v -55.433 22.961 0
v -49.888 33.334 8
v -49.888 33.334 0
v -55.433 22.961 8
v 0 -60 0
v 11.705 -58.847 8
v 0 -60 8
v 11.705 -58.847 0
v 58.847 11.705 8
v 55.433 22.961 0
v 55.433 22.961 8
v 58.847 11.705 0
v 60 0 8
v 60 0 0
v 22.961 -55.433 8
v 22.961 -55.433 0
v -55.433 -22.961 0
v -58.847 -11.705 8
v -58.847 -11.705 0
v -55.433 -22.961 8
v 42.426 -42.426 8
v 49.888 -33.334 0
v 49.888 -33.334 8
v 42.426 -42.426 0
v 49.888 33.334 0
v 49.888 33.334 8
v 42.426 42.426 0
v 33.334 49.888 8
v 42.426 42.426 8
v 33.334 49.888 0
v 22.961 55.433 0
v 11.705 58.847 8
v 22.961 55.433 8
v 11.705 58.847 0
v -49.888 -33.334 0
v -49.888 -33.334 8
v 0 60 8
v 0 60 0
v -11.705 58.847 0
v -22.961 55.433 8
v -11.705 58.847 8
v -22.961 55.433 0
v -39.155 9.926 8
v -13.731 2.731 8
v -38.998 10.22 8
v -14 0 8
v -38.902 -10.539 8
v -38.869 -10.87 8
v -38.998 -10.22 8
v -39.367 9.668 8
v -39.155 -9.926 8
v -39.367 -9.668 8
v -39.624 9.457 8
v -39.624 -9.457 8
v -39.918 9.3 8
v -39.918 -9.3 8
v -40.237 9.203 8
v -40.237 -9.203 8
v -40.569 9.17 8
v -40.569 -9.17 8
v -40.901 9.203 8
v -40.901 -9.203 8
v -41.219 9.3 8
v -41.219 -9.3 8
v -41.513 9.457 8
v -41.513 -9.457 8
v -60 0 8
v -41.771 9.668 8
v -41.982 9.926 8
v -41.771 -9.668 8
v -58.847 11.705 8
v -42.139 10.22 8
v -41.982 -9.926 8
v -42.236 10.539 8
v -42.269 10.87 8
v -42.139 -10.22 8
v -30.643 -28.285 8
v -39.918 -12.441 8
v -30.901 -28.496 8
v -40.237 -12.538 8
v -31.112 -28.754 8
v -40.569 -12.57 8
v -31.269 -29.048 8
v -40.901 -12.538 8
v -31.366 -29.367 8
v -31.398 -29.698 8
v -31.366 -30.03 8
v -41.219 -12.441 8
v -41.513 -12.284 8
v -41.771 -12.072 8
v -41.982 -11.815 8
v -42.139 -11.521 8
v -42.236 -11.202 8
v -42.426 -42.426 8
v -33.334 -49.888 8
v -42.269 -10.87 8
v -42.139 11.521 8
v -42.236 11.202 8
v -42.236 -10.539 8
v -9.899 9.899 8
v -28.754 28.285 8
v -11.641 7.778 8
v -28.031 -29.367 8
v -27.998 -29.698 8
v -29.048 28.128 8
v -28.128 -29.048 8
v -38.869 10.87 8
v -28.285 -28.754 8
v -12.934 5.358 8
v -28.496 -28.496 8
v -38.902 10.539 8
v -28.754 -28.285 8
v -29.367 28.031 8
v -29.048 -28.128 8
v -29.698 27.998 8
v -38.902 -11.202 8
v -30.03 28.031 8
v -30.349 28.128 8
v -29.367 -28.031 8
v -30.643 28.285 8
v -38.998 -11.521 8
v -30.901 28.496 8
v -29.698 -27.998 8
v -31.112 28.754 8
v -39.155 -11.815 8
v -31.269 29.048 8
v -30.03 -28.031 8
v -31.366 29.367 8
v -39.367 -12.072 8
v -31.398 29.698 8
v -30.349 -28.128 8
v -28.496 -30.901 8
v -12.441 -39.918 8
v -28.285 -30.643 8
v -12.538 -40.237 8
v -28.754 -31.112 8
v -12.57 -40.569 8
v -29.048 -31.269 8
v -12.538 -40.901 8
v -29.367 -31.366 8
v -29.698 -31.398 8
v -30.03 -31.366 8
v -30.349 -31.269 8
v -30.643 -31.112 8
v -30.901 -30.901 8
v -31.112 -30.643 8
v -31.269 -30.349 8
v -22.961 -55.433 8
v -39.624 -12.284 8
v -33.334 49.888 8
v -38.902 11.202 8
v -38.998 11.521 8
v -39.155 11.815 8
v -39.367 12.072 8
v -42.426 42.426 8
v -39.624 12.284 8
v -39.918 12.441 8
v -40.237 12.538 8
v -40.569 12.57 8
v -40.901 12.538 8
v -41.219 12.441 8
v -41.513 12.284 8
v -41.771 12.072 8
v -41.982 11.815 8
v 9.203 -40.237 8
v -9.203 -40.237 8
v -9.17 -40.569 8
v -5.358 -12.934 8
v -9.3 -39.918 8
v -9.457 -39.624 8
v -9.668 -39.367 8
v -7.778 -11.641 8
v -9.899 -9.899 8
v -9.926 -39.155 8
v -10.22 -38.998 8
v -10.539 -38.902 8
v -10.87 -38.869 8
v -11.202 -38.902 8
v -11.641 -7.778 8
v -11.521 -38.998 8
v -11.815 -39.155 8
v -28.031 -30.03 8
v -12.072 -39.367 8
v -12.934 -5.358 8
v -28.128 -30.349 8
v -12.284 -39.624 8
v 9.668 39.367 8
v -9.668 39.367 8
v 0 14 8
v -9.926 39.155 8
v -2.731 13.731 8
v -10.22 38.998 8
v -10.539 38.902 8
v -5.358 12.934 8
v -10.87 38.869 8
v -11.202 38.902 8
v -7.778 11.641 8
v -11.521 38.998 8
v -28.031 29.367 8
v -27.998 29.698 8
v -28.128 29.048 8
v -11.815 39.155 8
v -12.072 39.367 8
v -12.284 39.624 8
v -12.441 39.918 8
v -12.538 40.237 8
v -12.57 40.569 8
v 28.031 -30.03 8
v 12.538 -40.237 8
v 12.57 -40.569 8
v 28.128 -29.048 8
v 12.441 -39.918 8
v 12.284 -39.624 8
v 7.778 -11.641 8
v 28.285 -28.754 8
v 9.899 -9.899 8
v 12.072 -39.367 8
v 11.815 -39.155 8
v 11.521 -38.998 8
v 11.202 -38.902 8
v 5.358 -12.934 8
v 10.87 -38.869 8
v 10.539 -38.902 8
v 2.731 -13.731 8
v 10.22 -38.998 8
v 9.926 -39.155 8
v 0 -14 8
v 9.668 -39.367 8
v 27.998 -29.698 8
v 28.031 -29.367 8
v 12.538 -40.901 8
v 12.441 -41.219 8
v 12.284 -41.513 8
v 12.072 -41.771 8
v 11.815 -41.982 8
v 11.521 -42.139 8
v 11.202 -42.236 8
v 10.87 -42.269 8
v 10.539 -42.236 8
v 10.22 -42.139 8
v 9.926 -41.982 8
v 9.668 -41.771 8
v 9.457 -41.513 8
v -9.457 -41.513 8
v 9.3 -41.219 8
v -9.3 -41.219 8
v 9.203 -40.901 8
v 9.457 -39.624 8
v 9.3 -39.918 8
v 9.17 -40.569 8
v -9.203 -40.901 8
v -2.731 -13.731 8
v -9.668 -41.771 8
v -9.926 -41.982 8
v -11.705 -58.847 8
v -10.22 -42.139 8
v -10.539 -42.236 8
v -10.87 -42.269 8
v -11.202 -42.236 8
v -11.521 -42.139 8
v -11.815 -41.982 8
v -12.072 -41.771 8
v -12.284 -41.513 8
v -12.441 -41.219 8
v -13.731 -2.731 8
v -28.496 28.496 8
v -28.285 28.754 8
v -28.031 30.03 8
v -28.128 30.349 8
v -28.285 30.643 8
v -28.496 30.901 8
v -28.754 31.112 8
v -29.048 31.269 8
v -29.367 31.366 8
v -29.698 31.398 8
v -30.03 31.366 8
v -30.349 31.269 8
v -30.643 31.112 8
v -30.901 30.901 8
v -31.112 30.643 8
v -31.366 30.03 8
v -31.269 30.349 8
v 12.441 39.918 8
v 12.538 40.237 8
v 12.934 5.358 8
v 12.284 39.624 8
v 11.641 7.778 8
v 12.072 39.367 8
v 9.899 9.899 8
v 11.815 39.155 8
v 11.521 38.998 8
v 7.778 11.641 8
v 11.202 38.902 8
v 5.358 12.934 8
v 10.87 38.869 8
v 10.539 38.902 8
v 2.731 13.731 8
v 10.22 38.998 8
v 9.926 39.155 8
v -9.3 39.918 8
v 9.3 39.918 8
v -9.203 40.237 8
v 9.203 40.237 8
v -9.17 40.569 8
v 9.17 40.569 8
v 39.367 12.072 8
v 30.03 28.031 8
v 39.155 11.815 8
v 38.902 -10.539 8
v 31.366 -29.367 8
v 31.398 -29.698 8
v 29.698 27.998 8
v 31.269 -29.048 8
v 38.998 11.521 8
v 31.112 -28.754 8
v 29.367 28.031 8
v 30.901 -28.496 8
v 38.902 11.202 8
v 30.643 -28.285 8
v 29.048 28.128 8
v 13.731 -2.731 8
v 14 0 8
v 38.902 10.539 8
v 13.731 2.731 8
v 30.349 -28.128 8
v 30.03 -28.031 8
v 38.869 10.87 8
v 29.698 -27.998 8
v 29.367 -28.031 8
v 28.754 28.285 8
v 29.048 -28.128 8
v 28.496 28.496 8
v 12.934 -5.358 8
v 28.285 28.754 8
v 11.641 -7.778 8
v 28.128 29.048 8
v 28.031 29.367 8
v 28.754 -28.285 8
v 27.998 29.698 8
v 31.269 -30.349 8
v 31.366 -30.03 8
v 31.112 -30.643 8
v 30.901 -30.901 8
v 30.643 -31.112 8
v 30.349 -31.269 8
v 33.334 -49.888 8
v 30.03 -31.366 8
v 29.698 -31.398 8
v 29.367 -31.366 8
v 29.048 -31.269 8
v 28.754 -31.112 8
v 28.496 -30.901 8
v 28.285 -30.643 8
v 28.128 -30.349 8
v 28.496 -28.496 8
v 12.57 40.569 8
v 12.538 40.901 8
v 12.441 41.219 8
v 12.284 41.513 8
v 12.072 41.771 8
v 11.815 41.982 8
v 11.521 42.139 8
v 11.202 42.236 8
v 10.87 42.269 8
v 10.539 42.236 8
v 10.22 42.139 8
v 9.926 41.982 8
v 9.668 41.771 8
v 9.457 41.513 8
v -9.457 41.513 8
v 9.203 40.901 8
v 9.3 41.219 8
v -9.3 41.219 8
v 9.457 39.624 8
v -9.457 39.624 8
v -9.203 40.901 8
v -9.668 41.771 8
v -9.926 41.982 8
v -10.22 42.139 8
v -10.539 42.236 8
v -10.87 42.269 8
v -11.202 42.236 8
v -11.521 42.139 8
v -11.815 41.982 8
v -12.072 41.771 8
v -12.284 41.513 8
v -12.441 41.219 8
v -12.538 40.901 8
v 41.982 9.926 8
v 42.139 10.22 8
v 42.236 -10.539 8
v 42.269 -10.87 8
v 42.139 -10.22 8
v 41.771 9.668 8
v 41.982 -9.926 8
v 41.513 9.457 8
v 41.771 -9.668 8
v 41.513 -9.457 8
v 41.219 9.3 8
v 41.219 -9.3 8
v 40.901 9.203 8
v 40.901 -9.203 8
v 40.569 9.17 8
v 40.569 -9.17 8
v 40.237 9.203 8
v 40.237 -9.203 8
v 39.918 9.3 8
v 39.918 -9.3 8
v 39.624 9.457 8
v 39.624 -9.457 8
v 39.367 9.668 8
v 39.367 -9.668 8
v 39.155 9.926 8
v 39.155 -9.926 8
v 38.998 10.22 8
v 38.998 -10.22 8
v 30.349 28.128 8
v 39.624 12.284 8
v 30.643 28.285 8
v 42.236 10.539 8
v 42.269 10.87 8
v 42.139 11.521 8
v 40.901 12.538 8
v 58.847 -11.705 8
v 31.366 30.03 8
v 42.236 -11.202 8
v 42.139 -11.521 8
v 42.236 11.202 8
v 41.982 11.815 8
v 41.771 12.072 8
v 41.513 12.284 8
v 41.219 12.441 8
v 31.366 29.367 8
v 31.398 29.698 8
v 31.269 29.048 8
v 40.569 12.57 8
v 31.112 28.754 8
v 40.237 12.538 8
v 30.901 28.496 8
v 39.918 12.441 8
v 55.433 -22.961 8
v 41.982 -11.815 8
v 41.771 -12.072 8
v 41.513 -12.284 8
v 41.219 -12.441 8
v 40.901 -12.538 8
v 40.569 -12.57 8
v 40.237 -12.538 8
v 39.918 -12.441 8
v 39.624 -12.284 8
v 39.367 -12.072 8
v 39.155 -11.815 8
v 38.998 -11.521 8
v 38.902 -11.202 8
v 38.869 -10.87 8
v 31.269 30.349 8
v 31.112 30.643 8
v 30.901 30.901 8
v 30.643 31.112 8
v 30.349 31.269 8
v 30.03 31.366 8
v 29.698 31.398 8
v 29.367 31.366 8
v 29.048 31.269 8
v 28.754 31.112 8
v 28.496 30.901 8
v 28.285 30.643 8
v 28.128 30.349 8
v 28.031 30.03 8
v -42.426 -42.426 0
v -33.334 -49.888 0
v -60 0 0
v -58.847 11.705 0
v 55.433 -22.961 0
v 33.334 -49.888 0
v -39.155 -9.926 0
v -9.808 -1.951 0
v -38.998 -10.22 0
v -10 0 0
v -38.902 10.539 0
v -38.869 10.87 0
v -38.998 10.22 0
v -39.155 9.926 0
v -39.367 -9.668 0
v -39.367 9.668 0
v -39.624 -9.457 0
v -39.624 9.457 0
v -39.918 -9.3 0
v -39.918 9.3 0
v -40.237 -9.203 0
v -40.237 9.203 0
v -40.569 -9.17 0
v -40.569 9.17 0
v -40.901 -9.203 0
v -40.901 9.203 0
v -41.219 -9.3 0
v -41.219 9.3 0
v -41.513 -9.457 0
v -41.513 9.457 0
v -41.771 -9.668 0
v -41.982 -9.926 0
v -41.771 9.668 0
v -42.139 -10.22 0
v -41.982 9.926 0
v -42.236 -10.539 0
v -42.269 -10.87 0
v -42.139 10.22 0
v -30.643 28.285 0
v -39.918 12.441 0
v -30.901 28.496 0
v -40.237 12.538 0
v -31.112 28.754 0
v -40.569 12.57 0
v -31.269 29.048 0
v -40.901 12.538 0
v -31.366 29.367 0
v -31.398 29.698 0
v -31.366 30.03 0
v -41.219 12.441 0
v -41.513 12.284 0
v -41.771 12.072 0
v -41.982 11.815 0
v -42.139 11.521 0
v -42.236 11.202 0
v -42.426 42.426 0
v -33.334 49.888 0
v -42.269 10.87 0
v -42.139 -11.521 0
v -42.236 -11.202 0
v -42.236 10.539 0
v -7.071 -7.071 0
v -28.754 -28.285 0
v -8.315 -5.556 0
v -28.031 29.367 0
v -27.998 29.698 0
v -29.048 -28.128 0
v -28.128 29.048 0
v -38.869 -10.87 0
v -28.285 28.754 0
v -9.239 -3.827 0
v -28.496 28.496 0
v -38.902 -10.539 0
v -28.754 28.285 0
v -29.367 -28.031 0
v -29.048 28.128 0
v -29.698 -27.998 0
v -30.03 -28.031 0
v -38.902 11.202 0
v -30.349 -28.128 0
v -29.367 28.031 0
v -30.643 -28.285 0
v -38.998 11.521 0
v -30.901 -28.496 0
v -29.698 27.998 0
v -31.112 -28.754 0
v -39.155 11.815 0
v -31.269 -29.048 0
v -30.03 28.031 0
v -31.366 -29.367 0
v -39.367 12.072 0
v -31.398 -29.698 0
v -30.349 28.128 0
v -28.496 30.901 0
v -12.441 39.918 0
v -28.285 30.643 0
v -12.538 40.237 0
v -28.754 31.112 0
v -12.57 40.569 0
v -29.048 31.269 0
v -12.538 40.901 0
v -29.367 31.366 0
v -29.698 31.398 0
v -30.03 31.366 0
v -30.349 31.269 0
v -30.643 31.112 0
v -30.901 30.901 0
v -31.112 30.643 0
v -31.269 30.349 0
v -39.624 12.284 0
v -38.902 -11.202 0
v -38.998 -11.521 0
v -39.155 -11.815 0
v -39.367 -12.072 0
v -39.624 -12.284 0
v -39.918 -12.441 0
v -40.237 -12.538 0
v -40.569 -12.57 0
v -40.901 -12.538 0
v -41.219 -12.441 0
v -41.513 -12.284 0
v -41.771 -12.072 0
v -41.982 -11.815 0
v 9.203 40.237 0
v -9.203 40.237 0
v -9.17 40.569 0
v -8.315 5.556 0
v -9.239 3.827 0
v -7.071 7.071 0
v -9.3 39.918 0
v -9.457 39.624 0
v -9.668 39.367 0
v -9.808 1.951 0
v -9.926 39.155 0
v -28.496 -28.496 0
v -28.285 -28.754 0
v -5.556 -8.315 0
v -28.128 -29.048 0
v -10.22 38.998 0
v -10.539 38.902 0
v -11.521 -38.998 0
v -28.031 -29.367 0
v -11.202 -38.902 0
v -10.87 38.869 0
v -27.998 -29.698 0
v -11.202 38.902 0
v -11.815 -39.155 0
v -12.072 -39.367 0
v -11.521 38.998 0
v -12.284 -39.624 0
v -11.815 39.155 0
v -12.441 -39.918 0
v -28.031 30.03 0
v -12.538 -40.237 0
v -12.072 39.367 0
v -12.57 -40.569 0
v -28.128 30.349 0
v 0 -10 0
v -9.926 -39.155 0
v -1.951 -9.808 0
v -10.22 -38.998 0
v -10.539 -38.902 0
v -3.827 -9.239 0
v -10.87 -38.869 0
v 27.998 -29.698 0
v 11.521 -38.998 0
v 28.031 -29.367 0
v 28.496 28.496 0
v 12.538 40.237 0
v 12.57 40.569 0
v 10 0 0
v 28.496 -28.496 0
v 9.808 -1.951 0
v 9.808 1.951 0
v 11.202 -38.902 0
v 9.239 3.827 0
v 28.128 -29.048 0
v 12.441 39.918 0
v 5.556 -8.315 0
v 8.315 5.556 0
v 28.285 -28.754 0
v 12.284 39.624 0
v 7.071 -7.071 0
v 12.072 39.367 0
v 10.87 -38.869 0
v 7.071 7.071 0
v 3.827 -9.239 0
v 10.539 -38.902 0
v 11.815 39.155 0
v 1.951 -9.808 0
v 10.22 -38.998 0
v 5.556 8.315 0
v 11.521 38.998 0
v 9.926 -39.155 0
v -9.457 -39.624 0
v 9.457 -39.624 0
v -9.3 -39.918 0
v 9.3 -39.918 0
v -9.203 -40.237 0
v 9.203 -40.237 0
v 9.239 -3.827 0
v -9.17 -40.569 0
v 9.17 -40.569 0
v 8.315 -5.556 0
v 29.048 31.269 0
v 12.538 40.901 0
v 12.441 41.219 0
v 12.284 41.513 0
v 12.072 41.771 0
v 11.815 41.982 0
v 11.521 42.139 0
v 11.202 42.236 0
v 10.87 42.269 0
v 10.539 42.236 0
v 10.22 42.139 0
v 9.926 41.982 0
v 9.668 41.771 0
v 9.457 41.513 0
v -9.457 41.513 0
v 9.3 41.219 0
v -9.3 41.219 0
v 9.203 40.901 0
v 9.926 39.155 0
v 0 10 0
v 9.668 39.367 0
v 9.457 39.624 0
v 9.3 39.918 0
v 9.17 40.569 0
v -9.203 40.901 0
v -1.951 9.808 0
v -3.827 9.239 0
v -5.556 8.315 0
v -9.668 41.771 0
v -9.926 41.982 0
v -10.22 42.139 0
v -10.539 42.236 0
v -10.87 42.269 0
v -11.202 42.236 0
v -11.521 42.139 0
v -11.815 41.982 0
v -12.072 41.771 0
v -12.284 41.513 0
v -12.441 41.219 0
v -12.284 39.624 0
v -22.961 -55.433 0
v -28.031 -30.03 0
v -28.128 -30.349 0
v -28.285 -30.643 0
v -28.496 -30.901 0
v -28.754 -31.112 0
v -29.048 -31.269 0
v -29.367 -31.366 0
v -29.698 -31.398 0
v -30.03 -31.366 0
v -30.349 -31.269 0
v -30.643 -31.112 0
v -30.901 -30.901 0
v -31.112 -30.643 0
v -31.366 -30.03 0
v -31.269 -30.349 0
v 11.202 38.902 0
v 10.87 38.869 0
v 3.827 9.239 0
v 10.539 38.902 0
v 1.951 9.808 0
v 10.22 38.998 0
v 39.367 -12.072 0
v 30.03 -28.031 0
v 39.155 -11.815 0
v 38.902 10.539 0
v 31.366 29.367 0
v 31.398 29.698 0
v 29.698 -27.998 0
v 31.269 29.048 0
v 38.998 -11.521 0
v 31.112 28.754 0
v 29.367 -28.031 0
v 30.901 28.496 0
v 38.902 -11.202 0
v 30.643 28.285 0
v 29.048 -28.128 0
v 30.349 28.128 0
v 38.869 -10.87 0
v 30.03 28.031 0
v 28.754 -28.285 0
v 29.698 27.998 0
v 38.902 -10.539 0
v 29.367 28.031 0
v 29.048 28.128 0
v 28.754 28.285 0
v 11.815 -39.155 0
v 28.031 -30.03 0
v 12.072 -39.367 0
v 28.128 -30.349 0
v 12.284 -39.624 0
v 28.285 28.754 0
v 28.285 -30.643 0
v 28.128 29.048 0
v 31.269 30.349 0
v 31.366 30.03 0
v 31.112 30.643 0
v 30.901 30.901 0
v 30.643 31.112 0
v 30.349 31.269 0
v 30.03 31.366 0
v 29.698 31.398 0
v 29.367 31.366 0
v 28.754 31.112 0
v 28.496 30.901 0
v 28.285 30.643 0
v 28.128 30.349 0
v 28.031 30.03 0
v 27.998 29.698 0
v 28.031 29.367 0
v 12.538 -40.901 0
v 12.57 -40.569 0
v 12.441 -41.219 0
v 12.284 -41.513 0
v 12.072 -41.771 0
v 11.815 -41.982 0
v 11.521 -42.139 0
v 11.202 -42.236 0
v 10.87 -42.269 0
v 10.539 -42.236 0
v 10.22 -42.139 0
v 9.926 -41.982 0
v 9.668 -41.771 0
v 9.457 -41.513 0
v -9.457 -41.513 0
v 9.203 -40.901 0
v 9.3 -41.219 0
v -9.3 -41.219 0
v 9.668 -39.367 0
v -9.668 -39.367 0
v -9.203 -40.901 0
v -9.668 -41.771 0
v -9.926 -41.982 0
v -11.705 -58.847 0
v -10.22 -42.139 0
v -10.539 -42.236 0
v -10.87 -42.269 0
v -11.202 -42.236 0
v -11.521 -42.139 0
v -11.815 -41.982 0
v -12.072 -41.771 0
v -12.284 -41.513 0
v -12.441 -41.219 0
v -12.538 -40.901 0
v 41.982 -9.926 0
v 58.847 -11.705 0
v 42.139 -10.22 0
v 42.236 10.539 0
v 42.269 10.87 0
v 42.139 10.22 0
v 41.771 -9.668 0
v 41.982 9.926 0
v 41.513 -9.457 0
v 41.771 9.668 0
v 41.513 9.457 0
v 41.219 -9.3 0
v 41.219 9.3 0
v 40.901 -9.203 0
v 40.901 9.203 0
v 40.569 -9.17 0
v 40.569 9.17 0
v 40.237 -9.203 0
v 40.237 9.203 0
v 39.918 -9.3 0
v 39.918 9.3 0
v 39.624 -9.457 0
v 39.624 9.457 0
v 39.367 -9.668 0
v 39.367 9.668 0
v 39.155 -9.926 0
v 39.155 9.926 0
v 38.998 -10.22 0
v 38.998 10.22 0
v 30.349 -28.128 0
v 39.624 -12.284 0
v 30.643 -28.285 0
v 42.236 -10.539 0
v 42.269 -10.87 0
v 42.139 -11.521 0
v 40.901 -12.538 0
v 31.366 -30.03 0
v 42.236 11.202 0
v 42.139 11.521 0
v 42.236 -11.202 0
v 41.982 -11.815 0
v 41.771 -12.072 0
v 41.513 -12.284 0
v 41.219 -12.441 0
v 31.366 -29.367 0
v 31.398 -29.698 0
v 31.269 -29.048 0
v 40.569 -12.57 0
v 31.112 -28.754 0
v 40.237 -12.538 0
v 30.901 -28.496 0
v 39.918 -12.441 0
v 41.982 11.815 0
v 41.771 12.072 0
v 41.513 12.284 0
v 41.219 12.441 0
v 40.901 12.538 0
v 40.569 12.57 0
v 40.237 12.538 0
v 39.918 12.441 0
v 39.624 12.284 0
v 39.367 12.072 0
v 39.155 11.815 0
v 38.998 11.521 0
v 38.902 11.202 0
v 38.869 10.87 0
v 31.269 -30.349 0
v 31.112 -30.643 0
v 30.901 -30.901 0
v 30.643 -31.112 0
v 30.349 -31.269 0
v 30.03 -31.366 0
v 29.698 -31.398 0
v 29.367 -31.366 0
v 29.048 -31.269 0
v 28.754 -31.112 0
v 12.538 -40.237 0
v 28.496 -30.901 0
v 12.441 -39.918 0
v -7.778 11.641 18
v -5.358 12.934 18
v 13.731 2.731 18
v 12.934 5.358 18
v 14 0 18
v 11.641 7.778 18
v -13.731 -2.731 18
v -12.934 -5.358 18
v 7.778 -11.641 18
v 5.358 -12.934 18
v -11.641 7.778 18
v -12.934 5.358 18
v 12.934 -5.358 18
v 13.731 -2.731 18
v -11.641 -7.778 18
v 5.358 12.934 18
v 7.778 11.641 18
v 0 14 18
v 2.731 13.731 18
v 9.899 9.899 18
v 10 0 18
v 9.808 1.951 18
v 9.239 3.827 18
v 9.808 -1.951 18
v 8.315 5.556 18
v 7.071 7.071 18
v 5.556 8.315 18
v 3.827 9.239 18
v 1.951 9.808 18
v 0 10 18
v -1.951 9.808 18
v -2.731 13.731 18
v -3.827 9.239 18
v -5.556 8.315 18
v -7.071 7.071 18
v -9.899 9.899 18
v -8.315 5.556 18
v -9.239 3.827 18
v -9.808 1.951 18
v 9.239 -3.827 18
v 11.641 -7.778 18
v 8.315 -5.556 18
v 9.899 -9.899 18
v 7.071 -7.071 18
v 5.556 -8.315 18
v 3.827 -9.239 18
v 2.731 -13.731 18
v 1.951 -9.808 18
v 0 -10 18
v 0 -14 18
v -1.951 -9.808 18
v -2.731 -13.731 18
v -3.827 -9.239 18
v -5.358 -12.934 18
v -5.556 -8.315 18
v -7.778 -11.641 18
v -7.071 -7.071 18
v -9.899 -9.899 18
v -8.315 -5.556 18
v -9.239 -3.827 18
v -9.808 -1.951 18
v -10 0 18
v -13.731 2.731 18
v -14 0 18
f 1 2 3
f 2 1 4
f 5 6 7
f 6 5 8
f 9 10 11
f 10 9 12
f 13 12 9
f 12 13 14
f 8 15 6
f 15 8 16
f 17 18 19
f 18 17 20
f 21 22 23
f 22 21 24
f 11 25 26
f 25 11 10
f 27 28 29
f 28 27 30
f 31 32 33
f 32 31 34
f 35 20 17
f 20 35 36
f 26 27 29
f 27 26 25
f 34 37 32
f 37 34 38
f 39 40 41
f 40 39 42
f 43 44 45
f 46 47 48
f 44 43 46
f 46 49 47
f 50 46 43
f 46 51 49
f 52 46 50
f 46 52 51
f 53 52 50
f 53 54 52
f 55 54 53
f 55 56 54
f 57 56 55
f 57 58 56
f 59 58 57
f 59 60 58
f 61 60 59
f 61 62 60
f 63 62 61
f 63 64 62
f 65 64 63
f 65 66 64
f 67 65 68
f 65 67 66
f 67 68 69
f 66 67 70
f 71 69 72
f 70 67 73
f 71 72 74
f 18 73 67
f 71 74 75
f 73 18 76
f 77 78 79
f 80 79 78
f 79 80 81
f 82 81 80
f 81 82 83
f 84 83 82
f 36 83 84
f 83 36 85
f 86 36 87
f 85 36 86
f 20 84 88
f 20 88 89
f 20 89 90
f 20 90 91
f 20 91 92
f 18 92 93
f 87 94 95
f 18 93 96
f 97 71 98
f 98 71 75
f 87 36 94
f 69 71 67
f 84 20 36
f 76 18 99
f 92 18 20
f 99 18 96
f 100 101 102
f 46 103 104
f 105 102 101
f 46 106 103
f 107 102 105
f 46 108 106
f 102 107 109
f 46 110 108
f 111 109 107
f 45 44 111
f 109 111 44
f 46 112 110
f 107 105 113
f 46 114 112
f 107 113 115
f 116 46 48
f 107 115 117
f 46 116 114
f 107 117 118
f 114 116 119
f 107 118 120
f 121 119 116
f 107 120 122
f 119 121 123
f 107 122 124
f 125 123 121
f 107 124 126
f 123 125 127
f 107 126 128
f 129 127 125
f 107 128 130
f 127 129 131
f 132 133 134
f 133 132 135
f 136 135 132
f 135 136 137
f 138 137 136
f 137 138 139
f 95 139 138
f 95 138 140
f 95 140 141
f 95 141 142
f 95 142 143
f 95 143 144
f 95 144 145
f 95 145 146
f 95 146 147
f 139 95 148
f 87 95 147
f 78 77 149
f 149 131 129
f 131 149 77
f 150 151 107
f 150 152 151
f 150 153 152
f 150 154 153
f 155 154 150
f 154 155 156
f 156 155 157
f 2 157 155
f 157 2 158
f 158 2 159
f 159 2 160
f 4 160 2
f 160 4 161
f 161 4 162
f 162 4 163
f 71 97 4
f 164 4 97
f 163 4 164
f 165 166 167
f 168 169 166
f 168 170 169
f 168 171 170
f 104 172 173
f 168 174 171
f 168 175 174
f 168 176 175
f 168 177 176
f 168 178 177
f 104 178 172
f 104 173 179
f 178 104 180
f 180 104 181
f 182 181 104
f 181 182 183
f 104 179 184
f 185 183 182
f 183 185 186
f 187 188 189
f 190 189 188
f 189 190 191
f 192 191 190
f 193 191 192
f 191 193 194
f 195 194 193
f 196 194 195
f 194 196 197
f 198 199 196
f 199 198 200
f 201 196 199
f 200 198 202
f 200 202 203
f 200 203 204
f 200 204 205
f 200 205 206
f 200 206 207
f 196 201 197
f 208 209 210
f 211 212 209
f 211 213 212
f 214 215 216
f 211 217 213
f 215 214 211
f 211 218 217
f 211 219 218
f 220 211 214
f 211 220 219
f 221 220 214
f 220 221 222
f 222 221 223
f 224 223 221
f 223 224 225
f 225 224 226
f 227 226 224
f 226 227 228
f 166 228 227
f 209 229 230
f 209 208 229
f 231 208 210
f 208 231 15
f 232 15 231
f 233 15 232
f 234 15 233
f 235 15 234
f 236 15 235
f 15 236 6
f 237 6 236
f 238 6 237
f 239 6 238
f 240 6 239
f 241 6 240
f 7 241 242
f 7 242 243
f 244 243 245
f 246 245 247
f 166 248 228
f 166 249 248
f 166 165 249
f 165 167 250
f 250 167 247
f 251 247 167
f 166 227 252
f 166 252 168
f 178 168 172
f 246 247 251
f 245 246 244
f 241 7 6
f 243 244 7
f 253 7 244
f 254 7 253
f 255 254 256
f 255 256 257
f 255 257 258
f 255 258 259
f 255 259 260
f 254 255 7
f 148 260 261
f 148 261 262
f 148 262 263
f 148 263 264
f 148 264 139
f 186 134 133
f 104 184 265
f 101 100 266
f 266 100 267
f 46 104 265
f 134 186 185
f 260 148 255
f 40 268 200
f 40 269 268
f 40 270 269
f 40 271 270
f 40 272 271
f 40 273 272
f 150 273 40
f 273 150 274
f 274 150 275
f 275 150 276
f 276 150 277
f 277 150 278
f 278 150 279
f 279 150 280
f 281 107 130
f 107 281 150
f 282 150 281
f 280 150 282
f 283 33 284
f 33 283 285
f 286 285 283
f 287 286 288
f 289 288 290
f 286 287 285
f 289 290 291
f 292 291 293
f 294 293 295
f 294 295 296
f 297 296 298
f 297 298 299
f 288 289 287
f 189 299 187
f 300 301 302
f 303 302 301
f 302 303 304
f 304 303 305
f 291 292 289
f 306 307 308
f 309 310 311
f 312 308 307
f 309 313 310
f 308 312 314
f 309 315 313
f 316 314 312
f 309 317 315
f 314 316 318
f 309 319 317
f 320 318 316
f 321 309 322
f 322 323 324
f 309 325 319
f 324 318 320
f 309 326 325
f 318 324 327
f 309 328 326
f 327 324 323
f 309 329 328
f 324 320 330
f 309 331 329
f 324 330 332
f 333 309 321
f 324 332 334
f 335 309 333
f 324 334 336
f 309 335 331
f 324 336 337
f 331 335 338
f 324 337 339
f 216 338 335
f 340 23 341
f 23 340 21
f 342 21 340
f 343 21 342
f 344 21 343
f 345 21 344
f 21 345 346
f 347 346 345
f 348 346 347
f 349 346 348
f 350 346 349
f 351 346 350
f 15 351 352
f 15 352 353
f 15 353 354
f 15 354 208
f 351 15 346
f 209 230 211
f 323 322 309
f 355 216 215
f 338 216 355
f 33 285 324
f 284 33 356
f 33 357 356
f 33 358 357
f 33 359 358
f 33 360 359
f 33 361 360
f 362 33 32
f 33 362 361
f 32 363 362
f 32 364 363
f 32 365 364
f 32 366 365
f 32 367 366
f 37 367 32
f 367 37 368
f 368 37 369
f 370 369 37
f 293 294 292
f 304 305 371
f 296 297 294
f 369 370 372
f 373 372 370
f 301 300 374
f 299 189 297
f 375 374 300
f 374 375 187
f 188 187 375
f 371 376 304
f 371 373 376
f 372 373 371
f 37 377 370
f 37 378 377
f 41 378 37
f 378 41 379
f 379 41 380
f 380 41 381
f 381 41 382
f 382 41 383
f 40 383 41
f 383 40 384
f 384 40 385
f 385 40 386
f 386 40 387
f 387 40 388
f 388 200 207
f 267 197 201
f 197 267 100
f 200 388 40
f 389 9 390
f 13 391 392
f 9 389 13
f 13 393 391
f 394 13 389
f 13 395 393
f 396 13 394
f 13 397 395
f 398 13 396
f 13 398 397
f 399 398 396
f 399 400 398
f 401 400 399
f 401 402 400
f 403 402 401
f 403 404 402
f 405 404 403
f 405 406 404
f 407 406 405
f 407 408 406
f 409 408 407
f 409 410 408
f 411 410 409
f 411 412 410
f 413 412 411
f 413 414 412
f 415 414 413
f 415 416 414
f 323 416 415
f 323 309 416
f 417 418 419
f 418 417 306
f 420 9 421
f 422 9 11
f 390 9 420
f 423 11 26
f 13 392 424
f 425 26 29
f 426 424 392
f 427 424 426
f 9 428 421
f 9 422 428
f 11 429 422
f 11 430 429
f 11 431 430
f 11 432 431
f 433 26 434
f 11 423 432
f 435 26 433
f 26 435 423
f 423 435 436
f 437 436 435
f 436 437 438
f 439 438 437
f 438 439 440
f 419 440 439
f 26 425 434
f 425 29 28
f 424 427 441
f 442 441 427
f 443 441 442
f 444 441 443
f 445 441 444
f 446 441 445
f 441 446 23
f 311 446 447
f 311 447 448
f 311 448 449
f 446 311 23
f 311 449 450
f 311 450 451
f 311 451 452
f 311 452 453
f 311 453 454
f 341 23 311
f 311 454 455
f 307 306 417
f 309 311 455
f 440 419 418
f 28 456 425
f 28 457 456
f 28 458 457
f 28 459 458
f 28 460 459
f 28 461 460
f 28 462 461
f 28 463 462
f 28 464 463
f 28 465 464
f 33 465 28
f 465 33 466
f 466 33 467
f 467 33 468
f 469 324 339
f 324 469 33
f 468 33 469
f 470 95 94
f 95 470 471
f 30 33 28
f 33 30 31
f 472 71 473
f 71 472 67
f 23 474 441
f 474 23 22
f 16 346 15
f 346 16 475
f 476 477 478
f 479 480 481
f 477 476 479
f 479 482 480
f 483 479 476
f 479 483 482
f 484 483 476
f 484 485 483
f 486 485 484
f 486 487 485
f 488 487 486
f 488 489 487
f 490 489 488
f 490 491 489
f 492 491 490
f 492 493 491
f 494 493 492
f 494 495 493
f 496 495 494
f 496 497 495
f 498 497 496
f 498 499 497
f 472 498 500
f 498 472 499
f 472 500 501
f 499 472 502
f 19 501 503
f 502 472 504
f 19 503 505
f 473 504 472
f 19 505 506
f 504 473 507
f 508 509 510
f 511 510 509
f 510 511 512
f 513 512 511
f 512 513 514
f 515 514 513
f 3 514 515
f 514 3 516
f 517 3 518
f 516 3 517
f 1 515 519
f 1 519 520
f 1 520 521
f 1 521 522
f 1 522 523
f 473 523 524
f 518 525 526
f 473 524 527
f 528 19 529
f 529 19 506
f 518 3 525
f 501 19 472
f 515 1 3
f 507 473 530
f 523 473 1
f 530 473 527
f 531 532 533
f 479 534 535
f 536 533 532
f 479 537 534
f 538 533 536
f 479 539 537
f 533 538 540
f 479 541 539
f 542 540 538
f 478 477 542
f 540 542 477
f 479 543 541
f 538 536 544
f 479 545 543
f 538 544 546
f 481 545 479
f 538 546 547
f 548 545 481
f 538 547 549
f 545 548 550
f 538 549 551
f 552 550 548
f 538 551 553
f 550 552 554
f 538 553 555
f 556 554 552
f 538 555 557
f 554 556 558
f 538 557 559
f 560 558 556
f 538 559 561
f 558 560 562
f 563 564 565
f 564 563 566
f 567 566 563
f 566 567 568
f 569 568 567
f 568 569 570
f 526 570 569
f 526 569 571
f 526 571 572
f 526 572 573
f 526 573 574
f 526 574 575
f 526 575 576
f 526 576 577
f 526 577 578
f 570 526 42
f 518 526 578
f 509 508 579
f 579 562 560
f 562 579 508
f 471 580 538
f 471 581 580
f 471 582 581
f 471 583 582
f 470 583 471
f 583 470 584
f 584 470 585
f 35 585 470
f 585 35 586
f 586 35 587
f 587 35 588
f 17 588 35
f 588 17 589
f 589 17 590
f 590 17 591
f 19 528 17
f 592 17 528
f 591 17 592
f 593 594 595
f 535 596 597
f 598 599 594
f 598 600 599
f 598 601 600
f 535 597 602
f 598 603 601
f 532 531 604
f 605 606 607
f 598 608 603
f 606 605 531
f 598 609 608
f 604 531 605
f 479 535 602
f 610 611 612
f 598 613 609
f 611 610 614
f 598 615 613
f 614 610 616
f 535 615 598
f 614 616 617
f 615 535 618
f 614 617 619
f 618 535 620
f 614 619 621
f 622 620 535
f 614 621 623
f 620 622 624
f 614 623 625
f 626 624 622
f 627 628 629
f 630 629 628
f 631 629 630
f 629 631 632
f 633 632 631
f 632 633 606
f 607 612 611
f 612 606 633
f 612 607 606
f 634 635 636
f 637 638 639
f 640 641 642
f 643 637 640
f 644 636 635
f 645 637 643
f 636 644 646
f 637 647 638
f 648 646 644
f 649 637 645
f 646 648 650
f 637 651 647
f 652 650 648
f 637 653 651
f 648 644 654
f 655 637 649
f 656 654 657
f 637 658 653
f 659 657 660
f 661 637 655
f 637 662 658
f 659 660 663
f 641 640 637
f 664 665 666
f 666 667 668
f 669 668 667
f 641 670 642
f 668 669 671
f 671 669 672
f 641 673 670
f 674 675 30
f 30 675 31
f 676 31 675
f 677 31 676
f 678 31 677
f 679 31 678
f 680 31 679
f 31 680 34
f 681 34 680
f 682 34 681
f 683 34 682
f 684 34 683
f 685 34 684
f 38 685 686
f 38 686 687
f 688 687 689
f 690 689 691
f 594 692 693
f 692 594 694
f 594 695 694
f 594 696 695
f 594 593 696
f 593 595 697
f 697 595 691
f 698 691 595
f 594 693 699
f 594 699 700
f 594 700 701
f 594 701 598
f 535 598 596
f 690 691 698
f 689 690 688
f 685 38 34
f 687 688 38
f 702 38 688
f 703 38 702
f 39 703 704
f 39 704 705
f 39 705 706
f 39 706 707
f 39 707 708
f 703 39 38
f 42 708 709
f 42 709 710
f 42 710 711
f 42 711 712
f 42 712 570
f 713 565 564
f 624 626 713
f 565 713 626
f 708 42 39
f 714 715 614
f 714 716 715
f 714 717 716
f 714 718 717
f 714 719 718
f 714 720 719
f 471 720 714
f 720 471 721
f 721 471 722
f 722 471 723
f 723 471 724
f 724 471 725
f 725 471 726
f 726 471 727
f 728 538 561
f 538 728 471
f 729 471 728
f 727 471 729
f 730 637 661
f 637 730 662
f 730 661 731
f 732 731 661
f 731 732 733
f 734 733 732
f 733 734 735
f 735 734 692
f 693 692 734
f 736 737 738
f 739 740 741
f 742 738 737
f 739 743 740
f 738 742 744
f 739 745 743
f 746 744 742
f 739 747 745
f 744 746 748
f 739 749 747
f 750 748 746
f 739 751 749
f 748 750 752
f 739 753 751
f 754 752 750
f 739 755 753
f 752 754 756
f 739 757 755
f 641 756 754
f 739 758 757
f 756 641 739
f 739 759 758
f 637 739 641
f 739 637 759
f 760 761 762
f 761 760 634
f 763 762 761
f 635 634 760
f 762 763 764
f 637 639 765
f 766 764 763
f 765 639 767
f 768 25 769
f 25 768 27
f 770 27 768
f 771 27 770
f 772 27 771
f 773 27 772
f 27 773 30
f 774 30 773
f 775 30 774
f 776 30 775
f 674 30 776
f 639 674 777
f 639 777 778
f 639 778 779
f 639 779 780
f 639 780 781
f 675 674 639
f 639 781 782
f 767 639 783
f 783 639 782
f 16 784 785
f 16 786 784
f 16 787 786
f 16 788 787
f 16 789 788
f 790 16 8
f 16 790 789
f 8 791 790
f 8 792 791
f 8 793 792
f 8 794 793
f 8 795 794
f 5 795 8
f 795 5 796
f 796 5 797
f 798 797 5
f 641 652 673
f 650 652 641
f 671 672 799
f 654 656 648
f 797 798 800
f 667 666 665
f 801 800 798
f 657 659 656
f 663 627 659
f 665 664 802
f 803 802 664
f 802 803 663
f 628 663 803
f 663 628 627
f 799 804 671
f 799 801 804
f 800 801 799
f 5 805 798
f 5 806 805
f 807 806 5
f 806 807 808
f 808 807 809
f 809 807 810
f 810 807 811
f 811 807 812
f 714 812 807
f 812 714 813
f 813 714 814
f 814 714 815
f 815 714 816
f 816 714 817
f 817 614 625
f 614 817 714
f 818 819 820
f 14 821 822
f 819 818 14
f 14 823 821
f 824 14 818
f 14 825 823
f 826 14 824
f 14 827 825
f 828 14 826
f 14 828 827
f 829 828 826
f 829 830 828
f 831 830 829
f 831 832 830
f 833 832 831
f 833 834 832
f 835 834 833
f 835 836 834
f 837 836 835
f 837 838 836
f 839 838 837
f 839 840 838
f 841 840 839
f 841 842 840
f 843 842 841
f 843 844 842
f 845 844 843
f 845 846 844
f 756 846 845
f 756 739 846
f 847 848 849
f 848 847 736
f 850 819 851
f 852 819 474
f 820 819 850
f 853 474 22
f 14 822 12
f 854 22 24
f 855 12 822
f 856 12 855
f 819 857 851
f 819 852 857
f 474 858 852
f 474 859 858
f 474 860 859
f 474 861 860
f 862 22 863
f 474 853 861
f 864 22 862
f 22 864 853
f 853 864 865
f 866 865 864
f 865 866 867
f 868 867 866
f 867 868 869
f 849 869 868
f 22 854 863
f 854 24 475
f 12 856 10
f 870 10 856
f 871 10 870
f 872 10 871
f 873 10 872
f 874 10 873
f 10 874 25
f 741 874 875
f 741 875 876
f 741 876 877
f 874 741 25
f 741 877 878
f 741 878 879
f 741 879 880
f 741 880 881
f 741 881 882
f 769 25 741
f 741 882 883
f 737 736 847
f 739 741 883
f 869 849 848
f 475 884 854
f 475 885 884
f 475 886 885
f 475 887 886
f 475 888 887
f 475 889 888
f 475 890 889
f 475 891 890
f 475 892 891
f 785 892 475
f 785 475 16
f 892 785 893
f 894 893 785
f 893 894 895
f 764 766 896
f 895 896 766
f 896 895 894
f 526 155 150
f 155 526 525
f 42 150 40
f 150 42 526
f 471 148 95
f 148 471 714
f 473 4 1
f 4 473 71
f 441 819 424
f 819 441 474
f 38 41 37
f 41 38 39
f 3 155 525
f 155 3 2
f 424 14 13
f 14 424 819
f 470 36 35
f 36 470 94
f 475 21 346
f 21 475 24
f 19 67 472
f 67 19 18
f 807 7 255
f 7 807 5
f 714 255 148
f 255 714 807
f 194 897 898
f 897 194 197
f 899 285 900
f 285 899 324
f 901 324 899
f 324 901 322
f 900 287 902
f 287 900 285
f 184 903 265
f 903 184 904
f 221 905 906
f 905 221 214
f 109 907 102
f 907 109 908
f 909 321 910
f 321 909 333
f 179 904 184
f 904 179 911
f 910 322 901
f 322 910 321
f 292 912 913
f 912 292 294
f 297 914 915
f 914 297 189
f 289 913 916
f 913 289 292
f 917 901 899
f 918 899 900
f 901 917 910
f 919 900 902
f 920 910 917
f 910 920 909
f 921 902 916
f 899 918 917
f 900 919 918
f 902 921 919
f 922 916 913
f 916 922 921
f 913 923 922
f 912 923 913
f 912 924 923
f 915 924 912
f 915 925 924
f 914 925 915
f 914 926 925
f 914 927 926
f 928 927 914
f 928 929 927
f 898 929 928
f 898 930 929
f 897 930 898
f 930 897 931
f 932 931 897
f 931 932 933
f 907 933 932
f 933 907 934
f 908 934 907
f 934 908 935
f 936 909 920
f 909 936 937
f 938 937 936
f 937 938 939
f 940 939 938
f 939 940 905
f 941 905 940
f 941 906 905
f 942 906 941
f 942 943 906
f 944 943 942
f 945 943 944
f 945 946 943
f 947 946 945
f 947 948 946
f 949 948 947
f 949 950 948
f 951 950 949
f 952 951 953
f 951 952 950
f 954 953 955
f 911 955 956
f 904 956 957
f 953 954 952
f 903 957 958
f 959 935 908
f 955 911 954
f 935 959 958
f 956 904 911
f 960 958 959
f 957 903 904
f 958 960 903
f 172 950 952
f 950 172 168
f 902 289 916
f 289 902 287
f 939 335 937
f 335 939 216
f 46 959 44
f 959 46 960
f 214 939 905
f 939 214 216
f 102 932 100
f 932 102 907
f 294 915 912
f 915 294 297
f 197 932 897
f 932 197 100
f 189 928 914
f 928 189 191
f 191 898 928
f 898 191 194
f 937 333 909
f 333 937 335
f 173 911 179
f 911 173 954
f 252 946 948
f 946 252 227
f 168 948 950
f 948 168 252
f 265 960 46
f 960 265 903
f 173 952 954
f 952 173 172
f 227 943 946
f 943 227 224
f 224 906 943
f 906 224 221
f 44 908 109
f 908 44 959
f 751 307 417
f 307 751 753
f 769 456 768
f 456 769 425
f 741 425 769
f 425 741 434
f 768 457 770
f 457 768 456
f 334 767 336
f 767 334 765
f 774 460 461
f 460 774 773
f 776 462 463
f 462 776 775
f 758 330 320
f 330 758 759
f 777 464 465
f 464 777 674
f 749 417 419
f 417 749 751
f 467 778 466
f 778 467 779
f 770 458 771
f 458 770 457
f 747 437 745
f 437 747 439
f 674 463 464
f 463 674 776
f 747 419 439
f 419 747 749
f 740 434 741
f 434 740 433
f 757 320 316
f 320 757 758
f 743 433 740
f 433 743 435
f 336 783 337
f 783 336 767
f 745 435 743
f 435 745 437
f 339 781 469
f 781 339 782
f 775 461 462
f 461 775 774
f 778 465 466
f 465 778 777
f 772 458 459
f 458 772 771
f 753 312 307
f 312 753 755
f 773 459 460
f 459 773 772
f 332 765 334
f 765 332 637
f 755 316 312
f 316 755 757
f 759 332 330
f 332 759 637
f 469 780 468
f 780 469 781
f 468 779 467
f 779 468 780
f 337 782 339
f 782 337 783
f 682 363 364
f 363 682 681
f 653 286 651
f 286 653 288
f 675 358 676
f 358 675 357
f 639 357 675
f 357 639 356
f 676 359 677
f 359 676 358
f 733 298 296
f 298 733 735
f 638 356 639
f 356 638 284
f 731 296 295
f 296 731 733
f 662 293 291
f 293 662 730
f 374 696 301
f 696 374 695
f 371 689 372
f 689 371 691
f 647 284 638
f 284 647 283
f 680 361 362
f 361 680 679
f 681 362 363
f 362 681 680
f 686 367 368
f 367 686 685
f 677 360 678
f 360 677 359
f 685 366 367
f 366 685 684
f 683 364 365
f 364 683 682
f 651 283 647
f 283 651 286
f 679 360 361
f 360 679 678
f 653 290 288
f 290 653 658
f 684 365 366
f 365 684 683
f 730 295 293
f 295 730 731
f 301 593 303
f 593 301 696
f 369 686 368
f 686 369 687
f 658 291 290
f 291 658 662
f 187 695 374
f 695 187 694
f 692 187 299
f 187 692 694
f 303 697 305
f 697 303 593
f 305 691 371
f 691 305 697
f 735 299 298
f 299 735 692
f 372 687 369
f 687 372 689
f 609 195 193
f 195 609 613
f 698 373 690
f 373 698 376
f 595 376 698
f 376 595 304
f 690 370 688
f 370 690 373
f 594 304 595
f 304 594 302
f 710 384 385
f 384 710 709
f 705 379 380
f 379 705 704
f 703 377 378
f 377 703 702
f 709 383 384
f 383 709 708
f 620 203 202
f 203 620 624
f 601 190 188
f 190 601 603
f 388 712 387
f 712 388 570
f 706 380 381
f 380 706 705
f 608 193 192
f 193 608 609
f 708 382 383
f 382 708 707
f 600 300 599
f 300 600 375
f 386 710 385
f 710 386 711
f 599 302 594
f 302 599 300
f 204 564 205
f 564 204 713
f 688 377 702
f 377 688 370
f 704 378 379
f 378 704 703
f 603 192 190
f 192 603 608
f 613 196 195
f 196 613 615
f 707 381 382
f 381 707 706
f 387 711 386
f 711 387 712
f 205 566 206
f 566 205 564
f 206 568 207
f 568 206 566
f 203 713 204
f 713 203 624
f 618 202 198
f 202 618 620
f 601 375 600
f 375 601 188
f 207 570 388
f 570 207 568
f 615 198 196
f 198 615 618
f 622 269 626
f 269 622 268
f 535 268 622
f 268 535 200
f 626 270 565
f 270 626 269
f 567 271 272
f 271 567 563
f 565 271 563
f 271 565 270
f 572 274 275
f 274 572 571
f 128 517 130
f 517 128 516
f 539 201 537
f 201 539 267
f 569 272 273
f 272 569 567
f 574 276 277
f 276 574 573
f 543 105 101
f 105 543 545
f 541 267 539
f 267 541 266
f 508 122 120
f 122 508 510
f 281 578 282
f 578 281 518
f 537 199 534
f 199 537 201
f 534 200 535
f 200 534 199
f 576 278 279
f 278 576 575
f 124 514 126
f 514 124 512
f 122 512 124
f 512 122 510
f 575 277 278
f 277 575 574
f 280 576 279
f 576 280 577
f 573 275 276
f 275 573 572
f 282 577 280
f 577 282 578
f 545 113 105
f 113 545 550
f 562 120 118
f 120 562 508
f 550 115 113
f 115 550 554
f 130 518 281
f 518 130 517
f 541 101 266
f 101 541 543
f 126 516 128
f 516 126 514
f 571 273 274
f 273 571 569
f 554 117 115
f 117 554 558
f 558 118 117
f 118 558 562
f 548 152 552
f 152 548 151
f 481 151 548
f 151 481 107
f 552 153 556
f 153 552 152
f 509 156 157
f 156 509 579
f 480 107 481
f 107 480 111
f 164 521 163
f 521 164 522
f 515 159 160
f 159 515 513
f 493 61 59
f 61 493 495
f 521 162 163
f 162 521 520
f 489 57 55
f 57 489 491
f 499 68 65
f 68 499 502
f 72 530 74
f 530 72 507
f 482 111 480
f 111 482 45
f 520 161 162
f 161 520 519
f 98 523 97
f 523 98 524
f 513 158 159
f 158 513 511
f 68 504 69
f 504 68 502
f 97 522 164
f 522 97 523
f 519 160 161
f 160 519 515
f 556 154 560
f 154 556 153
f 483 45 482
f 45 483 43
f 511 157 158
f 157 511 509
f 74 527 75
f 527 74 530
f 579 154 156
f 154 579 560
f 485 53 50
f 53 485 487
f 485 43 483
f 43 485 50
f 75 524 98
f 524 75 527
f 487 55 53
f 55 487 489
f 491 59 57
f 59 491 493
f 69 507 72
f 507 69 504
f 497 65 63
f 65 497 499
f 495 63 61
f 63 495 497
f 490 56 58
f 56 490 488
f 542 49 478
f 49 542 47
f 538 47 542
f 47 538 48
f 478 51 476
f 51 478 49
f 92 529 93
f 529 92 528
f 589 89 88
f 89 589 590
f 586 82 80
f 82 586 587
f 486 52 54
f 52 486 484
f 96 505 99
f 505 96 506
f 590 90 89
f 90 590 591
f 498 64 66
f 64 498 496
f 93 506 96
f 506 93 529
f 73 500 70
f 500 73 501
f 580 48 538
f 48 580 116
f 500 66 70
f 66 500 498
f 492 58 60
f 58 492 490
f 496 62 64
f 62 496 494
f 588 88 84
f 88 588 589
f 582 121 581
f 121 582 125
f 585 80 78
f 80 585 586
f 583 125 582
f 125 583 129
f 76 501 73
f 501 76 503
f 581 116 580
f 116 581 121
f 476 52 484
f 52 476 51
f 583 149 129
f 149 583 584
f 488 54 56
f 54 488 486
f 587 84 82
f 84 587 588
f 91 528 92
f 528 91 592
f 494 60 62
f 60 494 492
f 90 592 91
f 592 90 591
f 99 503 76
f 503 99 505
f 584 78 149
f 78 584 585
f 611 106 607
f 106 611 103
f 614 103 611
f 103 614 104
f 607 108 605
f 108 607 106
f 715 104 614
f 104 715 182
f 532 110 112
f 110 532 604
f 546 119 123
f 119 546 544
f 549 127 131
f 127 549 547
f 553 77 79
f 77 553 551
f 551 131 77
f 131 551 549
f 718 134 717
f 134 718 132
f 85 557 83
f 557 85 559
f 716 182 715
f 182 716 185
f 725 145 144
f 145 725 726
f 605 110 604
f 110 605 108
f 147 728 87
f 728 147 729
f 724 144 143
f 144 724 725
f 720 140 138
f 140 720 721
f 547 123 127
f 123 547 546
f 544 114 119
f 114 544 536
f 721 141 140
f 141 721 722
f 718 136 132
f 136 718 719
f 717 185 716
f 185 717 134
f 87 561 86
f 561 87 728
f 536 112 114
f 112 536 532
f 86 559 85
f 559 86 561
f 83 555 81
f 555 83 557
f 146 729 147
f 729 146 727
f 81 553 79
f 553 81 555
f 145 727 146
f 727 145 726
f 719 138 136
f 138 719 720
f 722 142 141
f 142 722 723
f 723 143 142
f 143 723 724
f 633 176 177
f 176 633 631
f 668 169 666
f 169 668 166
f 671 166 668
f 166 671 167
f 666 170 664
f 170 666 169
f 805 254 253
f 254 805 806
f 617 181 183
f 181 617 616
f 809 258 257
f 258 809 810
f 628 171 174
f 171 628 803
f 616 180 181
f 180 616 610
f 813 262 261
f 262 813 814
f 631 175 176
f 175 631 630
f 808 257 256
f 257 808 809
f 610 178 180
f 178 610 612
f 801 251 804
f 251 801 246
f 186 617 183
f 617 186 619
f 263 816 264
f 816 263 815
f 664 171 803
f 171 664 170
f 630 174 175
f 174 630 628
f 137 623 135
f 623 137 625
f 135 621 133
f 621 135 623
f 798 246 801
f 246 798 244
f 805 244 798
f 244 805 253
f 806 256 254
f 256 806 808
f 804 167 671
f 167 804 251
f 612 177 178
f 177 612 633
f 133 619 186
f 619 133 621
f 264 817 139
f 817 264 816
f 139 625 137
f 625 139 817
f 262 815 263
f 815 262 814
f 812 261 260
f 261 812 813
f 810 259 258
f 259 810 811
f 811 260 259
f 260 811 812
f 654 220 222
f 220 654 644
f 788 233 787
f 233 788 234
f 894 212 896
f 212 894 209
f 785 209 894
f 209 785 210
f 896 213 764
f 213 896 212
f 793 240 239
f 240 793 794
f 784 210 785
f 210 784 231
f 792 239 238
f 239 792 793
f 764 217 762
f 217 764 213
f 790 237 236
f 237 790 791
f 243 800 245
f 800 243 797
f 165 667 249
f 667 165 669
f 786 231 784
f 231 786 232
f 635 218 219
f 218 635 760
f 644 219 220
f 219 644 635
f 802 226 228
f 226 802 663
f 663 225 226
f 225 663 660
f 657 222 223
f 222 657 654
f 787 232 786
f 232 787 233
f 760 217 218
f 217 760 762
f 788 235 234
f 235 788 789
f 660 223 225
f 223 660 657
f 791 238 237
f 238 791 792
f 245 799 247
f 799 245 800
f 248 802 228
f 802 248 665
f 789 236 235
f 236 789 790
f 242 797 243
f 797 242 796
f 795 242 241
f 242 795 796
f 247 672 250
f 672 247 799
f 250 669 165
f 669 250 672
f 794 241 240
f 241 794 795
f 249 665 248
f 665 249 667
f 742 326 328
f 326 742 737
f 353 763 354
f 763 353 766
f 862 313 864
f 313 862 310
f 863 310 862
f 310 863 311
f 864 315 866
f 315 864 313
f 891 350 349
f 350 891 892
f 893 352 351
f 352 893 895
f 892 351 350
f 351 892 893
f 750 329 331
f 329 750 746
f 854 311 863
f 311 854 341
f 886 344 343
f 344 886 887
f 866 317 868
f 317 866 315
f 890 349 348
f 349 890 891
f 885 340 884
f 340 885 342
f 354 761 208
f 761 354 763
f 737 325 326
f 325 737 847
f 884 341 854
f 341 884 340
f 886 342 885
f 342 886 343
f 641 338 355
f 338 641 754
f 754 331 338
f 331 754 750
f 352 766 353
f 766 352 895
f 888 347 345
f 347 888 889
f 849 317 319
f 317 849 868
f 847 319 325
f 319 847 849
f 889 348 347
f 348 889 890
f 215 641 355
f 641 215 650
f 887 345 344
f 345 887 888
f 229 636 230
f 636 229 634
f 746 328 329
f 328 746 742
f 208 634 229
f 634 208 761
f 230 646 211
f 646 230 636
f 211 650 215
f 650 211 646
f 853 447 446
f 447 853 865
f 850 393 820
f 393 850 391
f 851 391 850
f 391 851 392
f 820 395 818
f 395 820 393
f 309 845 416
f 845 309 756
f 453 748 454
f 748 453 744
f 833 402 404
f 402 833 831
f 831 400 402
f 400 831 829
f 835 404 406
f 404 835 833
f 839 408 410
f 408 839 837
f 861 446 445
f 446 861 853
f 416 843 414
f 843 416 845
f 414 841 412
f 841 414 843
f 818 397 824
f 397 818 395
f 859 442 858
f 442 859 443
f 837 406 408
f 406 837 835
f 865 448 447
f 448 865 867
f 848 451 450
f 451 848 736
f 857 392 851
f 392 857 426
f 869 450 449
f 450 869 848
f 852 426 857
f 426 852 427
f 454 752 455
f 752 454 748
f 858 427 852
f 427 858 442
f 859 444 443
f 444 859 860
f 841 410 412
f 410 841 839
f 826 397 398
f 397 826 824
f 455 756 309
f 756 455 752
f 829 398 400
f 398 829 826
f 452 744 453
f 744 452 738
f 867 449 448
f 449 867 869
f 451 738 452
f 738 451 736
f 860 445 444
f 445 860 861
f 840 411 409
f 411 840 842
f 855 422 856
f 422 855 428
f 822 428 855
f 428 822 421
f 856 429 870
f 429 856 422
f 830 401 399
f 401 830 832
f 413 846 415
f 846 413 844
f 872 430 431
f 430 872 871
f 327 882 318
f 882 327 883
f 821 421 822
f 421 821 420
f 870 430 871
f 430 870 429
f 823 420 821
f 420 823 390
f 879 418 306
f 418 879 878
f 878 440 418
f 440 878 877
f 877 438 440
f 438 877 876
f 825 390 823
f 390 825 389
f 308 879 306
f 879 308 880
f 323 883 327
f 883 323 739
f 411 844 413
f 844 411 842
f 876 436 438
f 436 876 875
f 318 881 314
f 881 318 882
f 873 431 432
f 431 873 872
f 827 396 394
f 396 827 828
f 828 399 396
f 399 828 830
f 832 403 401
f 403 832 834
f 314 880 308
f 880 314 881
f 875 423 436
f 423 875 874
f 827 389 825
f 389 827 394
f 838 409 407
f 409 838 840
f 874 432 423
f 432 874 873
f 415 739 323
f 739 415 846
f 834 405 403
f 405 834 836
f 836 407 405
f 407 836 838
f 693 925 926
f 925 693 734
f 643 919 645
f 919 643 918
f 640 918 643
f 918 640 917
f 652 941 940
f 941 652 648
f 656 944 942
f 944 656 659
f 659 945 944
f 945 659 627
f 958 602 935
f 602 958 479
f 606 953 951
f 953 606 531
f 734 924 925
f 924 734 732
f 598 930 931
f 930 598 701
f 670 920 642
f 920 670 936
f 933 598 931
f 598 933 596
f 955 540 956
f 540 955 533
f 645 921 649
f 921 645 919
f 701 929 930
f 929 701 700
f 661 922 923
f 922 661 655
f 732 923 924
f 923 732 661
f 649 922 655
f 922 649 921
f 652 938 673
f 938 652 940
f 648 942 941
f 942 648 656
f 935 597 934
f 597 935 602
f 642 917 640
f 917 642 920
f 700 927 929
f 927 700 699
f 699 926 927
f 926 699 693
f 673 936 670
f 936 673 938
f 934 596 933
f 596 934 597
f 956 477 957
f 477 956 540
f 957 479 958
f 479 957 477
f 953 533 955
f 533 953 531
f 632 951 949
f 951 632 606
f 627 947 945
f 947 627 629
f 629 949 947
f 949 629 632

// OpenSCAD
$fn = 32;

// ----------------------------------------------------------------------
// Flange Ø120 x 8
// 12 holes on a Ø84 bolt circle, bolted joints
// ----------------------------------------------------------------------

// --- parameters (mm) ---
flange_d = 120;  // outside diameter of the flange
thickness = 8;   // flange thickness
holes = 12;      // number of bolt holes
pcd = 84;        // bolt circle diameter
start_deg = 45;  // angle of the first hole, from +X
hole_d = 3.4;    // bolt hole diameter
bore_d = 20;     // central through bore
hub_d = 28;      // hub outside diameter
hub_h = 10;      // hub height above the flange face (0 = no hub)

// --- derived feature positions (mm) ---
height = thickness + hub_h;  // = 18   overall height of the part
pcd_r = pcd / 2;             // = 42   bolt circle radius
hole_step = 360 / holes;     // = 30   angular pitch
feature_centers = [
  [pcd_r * cos(start_deg + 0 * hole_step), pcd_r * sin(start_deg + 0 * hole_step)],
  [pcd_r * cos(start_deg + 1 * hole_step), pcd_r * sin(start_deg + 1 * hole_step)],
  [pcd_r * cos(start_deg + 2 * hole_step), pcd_r * sin(start_deg + 2 * hole_step)],
  [pcd_r * cos(start_deg + 3 * hole_step), pcd_r * sin(start_deg + 3 * hole_step)],
  [pcd_r * cos(start_deg + 4 * hole_step), pcd_r * sin(start_deg + 4 * hole_step)],
  [pcd_r * cos(start_deg + 5 * hole_step), pcd_r * sin(start_deg + 5 * hole_step)],
  [pcd_r * cos(start_deg + 6 * hole_step), pcd_r * sin(start_deg + 6 * hole_step)],
  [pcd_r * cos(start_deg + 7 * hole_step), pcd_r * sin(start_deg + 7 * hole_step)],
  [pcd_r * cos(start_deg + 8 * hole_step), pcd_r * sin(start_deg + 8 * hole_step)],
  [pcd_r * cos(start_deg + 9 * hole_step), pcd_r * sin(start_deg + 9 * hole_step)],
  [pcd_r * cos(start_deg + 10 * hole_step), pcd_r * sin(start_deg + 10 * hole_step)],
  [pcd_r * cos(start_deg + 11 * hole_step), pcd_r * sin(start_deg + 11 * hole_step)]
];   // bolt hole centres on the pitch circle

// flange disc, every hole and the bore cut straight through
difference() {
  union() {
    cylinder(d = flange_d, h = thickness);
    cylinder(d = hub_d, h = height);  // hub, overlapped into the flange
  }
  translate([0, 0, -1]) cylinder(d = bore_d, h = height + 2);  // bore, through
  for (centre = feature_centers)
    translate([centre[0], centre[1], -1]) cylinder(d = hole_d, h = thickness + 2);
}
